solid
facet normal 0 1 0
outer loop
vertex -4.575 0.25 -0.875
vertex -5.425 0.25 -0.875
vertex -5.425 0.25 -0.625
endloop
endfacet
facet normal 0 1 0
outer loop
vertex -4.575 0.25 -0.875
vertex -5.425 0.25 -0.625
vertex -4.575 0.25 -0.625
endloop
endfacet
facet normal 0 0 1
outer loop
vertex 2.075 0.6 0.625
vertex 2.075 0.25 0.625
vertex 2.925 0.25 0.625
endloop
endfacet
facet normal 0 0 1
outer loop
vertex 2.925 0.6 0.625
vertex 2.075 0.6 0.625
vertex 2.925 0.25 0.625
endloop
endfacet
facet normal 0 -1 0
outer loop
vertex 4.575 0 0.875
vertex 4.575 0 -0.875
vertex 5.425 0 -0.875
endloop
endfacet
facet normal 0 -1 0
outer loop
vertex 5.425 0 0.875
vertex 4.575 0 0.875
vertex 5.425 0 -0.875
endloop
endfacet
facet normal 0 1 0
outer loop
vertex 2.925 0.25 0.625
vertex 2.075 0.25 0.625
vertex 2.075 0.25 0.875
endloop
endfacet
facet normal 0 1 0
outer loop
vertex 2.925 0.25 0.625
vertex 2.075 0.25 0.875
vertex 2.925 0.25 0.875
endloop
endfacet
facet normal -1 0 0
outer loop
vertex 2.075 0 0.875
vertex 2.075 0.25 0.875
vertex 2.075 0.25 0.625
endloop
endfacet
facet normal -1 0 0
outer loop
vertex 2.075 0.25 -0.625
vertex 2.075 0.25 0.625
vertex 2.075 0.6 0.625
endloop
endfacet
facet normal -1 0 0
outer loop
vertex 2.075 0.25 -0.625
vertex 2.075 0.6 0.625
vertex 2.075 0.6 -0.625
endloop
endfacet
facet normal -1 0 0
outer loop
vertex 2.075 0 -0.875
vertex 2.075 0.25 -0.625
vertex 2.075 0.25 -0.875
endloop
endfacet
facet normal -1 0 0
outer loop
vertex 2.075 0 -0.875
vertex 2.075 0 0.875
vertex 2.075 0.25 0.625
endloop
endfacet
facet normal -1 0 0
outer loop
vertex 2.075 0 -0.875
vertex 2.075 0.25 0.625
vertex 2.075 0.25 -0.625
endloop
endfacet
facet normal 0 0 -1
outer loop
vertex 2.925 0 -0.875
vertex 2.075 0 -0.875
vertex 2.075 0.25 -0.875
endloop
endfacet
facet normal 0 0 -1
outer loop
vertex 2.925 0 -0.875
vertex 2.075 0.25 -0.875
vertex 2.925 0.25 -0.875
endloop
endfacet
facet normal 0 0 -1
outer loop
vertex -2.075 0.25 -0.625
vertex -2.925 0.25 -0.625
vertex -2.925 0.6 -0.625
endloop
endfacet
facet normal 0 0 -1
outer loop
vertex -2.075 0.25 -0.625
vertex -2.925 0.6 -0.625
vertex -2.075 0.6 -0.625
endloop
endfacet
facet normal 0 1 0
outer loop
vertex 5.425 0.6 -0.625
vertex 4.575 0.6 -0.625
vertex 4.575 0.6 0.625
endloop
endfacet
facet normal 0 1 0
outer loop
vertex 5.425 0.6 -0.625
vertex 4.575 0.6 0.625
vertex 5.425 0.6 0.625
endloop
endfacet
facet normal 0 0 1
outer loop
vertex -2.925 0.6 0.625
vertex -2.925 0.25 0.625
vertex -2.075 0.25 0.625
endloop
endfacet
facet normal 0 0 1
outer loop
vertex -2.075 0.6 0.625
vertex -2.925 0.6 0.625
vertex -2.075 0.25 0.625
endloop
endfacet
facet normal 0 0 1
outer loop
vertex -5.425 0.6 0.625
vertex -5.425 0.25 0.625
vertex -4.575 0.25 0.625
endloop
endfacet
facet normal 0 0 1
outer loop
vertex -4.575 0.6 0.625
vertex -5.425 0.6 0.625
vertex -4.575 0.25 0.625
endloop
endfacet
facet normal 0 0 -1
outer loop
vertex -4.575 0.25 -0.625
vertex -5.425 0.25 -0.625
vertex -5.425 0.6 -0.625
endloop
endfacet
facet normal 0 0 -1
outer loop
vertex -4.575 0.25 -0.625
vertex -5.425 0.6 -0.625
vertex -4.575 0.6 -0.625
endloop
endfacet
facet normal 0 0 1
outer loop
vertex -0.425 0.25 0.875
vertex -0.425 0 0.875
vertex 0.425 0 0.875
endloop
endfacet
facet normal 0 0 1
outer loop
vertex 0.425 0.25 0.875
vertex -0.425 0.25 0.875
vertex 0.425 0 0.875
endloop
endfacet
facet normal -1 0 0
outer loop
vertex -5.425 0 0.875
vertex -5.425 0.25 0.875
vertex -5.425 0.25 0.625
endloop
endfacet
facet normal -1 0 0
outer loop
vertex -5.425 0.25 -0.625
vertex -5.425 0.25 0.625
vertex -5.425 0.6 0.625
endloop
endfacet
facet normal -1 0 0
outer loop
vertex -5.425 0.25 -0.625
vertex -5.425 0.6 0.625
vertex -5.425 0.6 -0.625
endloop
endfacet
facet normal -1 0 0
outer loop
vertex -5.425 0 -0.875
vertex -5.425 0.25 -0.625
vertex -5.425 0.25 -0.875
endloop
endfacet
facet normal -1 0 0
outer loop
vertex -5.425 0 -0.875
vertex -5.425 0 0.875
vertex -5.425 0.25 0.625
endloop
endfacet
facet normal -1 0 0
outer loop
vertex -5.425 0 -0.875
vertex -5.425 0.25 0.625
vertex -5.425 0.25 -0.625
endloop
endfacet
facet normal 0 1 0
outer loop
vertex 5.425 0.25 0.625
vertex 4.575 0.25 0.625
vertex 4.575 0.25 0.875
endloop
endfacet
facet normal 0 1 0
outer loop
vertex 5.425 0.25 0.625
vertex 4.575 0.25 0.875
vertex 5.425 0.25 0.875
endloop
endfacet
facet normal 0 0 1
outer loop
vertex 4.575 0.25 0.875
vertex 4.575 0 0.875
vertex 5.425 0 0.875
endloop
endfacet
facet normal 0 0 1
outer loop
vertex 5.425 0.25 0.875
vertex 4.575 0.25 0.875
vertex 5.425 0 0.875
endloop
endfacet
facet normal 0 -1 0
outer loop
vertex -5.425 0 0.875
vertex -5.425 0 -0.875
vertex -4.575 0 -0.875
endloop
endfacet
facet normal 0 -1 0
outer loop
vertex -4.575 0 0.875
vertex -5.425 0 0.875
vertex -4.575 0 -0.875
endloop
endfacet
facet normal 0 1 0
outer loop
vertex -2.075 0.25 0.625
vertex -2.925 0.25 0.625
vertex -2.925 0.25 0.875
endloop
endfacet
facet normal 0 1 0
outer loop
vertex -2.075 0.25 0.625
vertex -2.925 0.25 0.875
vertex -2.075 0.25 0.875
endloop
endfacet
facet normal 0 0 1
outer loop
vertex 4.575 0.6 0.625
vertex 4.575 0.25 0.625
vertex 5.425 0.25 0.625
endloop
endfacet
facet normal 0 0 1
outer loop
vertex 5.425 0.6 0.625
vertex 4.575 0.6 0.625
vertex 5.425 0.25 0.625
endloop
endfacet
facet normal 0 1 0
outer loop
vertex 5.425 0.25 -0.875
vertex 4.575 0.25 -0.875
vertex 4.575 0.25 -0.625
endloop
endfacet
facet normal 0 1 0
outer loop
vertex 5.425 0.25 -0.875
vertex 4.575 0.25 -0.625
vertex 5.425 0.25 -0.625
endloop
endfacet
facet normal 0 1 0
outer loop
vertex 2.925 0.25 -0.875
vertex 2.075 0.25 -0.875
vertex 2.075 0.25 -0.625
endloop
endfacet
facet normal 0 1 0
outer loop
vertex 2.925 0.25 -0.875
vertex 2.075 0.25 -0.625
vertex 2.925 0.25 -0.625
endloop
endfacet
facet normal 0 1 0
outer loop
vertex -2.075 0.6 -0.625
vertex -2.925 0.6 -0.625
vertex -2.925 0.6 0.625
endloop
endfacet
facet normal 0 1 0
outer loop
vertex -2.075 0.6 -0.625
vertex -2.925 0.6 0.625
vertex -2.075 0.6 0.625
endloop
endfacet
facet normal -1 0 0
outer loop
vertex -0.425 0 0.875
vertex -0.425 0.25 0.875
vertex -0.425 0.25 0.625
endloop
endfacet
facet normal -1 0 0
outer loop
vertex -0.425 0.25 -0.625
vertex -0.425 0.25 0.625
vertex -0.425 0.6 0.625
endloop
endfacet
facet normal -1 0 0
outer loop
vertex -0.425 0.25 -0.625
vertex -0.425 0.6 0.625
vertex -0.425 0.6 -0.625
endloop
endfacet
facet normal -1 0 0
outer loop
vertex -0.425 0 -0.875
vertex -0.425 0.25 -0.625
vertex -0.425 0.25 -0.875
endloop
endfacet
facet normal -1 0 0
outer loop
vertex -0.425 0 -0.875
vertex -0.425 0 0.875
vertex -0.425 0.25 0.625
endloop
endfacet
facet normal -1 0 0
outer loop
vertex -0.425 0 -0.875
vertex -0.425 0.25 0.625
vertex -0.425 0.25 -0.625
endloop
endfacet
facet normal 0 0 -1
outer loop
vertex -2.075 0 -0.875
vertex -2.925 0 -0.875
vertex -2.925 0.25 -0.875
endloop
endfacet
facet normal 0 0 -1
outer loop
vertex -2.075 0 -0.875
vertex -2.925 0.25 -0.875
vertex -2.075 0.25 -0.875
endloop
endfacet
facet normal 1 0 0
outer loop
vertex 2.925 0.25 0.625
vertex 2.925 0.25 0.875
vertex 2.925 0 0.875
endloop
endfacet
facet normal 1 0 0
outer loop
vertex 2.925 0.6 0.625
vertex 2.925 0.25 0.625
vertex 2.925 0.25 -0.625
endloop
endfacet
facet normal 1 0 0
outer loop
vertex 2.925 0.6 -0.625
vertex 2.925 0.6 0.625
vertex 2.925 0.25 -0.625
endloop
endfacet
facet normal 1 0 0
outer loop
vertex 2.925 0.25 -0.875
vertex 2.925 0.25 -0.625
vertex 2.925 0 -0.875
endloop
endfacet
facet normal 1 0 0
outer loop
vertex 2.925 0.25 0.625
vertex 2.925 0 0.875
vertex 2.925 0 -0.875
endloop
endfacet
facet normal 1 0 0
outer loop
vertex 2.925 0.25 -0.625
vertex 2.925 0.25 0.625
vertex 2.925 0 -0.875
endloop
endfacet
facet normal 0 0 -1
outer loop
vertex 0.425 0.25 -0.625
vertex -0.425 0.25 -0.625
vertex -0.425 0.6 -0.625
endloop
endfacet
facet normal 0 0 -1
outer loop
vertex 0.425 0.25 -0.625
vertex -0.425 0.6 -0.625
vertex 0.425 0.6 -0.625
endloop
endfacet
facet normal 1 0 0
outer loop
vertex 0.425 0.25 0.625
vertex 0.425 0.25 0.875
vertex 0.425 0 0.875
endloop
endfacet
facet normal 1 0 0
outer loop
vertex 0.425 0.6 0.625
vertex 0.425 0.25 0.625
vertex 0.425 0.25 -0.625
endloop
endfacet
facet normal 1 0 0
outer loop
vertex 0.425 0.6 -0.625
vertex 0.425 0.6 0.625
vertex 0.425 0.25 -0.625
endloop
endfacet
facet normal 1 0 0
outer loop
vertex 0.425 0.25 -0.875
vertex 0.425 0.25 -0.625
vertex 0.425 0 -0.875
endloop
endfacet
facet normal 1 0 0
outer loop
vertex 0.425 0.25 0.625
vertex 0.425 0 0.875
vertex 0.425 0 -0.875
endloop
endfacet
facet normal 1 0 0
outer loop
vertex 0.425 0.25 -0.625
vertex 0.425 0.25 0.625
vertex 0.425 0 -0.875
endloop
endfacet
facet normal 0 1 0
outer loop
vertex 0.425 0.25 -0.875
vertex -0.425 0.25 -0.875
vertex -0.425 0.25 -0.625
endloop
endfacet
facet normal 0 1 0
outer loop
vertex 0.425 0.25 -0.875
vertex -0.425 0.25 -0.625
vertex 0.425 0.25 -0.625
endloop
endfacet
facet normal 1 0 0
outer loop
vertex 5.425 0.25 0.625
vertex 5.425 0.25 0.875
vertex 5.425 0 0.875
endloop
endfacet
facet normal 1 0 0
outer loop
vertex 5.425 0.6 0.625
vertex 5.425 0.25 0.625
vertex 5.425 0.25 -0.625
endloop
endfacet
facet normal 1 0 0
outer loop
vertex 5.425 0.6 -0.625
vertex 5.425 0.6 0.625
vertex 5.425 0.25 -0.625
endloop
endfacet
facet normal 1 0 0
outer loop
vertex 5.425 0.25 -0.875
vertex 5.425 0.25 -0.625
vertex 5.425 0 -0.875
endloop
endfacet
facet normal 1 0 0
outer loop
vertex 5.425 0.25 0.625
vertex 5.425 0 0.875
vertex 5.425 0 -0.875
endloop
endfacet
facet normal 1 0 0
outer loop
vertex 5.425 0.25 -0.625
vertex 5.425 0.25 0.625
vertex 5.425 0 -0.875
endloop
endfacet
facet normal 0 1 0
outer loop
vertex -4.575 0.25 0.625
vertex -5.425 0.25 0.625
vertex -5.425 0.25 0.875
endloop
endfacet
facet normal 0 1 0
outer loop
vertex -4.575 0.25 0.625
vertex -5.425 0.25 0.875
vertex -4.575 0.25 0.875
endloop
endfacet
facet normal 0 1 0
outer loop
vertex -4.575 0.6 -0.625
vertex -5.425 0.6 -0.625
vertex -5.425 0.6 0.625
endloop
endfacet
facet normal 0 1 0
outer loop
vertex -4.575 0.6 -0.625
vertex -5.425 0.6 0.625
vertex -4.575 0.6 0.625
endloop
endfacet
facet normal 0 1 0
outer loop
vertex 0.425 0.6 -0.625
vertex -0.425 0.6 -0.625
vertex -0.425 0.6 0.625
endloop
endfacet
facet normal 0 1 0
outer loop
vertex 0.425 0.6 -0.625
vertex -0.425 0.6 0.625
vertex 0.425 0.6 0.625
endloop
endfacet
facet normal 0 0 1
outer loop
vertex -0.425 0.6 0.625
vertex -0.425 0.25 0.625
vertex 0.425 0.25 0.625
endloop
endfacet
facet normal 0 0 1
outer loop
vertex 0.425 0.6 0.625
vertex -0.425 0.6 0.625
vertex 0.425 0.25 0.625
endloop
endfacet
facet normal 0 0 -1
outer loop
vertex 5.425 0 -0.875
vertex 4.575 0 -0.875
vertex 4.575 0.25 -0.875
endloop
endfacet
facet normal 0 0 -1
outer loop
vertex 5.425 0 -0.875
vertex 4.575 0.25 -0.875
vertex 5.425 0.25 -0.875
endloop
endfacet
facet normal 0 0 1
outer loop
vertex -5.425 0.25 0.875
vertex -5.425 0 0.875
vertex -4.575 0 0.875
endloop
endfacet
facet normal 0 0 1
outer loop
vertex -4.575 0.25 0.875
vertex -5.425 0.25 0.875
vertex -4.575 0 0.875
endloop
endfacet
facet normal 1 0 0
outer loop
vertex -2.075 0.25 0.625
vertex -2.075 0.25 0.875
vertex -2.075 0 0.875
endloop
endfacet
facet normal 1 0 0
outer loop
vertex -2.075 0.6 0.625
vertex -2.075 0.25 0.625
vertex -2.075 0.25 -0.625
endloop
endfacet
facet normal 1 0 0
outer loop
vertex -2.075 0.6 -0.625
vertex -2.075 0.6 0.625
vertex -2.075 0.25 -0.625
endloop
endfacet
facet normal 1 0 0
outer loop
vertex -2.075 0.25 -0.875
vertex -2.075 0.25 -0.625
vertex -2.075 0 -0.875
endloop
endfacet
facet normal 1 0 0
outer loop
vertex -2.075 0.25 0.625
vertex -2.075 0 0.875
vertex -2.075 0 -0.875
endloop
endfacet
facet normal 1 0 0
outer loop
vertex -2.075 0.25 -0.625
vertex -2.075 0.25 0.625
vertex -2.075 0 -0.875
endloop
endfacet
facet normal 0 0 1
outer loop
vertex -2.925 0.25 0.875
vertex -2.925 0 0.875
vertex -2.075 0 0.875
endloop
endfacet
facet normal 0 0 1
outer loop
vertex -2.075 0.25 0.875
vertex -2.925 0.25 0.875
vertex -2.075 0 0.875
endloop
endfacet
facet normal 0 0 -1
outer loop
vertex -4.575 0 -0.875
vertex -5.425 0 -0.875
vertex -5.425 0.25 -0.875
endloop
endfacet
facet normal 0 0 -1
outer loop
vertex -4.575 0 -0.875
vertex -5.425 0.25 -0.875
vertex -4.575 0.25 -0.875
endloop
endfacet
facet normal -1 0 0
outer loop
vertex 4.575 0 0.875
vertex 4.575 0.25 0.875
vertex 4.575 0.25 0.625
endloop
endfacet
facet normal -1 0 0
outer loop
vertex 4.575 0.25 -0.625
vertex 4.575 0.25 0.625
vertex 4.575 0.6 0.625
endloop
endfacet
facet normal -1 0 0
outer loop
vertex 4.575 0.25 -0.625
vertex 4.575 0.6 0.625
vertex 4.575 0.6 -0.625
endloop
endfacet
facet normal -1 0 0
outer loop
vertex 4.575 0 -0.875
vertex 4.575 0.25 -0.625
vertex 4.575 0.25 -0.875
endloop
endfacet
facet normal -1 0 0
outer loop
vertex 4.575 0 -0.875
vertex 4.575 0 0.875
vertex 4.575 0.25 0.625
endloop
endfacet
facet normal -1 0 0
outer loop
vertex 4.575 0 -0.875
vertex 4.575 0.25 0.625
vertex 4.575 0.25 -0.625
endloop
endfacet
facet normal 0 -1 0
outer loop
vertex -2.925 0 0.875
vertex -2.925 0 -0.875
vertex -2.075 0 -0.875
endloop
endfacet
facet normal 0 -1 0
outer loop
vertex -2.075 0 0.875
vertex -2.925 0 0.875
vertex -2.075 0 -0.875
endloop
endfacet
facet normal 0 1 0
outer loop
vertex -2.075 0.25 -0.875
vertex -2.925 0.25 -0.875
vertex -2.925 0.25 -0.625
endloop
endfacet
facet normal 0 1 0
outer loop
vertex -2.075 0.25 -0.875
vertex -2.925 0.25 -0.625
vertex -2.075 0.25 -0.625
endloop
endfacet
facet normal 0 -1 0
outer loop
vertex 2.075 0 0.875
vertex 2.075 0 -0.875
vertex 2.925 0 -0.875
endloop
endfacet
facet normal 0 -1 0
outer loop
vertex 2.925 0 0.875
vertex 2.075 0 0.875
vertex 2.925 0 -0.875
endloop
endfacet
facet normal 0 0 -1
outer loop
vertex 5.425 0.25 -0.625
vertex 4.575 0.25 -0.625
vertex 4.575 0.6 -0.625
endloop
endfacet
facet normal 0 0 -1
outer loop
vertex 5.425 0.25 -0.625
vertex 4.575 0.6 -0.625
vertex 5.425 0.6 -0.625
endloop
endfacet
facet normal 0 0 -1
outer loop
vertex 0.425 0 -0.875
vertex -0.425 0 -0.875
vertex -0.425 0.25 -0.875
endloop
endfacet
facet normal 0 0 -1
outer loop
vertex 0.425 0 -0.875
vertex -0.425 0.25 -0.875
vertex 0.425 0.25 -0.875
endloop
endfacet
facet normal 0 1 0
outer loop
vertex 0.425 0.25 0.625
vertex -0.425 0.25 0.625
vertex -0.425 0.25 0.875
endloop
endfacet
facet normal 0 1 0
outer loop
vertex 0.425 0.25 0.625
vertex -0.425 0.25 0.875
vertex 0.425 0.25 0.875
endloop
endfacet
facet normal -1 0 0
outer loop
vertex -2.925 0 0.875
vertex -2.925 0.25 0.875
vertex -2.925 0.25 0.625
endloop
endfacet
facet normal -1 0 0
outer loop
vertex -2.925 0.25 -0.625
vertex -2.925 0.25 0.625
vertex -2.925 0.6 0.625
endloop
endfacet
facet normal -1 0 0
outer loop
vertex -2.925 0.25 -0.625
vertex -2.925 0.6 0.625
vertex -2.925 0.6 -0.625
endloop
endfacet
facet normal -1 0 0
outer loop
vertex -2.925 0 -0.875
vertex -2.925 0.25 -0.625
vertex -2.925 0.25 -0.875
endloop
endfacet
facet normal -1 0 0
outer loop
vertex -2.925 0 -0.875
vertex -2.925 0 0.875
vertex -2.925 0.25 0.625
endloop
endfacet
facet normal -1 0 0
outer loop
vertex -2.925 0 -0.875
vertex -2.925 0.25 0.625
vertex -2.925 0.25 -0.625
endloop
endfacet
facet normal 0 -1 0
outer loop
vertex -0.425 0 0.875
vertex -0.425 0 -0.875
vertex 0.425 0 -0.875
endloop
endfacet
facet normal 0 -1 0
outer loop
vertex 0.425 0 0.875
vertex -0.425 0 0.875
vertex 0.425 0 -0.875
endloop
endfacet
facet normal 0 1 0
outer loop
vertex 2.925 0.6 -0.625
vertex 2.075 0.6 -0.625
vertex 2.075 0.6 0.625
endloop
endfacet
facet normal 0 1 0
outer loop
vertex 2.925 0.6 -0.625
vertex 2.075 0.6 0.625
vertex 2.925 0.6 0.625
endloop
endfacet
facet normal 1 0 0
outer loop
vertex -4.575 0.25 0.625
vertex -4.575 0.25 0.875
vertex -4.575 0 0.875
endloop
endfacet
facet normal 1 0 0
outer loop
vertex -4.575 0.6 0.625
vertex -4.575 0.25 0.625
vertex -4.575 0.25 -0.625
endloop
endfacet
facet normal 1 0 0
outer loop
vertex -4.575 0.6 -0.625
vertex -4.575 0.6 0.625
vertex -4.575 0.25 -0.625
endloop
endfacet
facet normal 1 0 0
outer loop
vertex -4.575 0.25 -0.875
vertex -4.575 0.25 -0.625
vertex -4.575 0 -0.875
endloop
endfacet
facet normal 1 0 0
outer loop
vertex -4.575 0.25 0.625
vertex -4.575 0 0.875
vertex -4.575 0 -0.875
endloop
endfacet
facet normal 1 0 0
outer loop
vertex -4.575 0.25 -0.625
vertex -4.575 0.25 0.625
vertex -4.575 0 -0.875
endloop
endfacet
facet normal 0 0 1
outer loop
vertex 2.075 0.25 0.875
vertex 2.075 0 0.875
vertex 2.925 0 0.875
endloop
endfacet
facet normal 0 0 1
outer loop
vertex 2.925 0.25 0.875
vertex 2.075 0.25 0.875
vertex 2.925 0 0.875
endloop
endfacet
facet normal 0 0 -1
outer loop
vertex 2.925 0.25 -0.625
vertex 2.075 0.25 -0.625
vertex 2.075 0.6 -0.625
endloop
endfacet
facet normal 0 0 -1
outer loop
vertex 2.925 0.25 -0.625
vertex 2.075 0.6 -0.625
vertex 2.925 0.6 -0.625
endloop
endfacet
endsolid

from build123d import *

# Parameters (mm, degrees)
SKETCH1_W             = 0.85
SKETCH1_H             = 1.25
BOSS_EXTRUDE1_DEPTH   = 0.6
BOSS_EXTRUDE1_2_DEPTH = 0.6
BOSS_EXTRUDE1_3_DEPTH = 0.6
BOSS_EXTRUDE1_4_DEPTH = 0.6
BOSS_EXTRUDE1_5_DEPTH = 0.6
SKETCH2_W             = 0.85
SKETCH2_H             = 0.25
BOSS_EXTRUDE2_DEPTH   = 0.25


with BuildPart() as part:
    # Sketch1 → Boss-Extrude1 (new body)
    with BuildSketch(Plane(origin=(0, 0, 0), x_dir=(1, 0, 0), z_dir=(0, 1, 0))):
        with Locations((-5, 0)):
            Rectangle(SKETCH1_W, SKETCH1_H)
    extrude(amount=BOSS_EXTRUDE1_DEPTH)



with BuildPart() as body_2:
    # Sketch1 → Boss-Extrude1 2 (new body)
    with BuildSketch(Plane(origin=(0, 0, 0), x_dir=(1, 0, 0), z_dir=(0, 1, 0))):
        with Locations((5, 0)):
            Rectangle(SKETCH1_W, SKETCH1_H)
    extrude(amount=BOSS_EXTRUDE1_2_DEPTH)


with BuildPart() as body_3:
    # Sketch1 → Boss-Extrude1 3 (new body)
    with BuildSketch(Plane(origin=(0, 0, 0), x_dir=(1, 0, 0), z_dir=(0, 1, 0))):
        with Locations((-2.5, 0)):
            Rectangle(SKETCH1_W, SKETCH1_H)
    extrude(amount=BOSS_EXTRUDE1_3_DEPTH)


with BuildPart() as body_4:
    # Sketch1 → Boss-Extrude1 4 (new body)
    with BuildSketch(Plane(origin=(0, 0, 0), x_dir=(1, 0, 0), z_dir=(0, 1, 0))):
        Rectangle(SKETCH1_W, SKETCH1_H)
    extrude(amount=BOSS_EXTRUDE1_4_DEPTH)


with BuildPart() as body_5:
    # Sketch1 → Boss-Extrude1 5 (new body)
    with BuildSketch(Plane(origin=(0, 0, 0), x_dir=(1, 0, 0), z_dir=(0, 1, 0))):
        with Locations((2.5, 0)):
            Rectangle(SKETCH1_W, SKETCH1_H)
    extrude(amount=BOSS_EXTRUDE1_5_DEPTH)


with BuildPart() as part_1:
    add(part.part)

    add(body_2.part)  # Boss-Extrude2 merges body 2

    add(body_3.part)  # Boss-Extrude2 merges body 3

    add(body_4.part)  # Boss-Extrude2 merges body 4

    add(body_5.part)  # Boss-Extrude2 merges body 5
    # Sketch2 → Boss-Extrude2 (add)
    with BuildSketch(Plane(origin=(0, 0, 0), x_dir=(1, 0, 0), z_dir=(0, 1, 0))):
        with Locations((-5, 0.75)):
            Rectangle(SKETCH2_W, SKETCH2_H)
        with Locations((-2.5, 0.75)):
            Rectangle(SKETCH2_W, SKETCH2_H)
        with Locations((0, 0.75)):
            Rectangle(SKETCH2_W, SKETCH2_H)
        with Locations((2.5, 0.75)):
            Rectangle(SKETCH2_W, SKETCH2_H)
        with Locations((5, 0.75)):
            Rectangle(SKETCH2_W, SKETCH2_H)
        with Locations((5, -0.75)):
            Rectangle(SKETCH2_W, SKETCH2_H)
        with Locations((2.5, -0.75)):
            Rectangle(SKETCH2_W, SKETCH2_H)
        with Locations((0, -0.75)):
            Rectangle(SKETCH2_W, SKETCH2_H)
        with Locations((-2.5, -0.75)):
            Rectangle(SKETCH2_W, SKETCH2_H)
        with Locations((-5, -0.75)):
            Rectangle(SKETCH2_W, SKETCH2_H)
    extrude(amount=BOSS_EXTRUDE2_DEPTH)


solid = part_1.part
